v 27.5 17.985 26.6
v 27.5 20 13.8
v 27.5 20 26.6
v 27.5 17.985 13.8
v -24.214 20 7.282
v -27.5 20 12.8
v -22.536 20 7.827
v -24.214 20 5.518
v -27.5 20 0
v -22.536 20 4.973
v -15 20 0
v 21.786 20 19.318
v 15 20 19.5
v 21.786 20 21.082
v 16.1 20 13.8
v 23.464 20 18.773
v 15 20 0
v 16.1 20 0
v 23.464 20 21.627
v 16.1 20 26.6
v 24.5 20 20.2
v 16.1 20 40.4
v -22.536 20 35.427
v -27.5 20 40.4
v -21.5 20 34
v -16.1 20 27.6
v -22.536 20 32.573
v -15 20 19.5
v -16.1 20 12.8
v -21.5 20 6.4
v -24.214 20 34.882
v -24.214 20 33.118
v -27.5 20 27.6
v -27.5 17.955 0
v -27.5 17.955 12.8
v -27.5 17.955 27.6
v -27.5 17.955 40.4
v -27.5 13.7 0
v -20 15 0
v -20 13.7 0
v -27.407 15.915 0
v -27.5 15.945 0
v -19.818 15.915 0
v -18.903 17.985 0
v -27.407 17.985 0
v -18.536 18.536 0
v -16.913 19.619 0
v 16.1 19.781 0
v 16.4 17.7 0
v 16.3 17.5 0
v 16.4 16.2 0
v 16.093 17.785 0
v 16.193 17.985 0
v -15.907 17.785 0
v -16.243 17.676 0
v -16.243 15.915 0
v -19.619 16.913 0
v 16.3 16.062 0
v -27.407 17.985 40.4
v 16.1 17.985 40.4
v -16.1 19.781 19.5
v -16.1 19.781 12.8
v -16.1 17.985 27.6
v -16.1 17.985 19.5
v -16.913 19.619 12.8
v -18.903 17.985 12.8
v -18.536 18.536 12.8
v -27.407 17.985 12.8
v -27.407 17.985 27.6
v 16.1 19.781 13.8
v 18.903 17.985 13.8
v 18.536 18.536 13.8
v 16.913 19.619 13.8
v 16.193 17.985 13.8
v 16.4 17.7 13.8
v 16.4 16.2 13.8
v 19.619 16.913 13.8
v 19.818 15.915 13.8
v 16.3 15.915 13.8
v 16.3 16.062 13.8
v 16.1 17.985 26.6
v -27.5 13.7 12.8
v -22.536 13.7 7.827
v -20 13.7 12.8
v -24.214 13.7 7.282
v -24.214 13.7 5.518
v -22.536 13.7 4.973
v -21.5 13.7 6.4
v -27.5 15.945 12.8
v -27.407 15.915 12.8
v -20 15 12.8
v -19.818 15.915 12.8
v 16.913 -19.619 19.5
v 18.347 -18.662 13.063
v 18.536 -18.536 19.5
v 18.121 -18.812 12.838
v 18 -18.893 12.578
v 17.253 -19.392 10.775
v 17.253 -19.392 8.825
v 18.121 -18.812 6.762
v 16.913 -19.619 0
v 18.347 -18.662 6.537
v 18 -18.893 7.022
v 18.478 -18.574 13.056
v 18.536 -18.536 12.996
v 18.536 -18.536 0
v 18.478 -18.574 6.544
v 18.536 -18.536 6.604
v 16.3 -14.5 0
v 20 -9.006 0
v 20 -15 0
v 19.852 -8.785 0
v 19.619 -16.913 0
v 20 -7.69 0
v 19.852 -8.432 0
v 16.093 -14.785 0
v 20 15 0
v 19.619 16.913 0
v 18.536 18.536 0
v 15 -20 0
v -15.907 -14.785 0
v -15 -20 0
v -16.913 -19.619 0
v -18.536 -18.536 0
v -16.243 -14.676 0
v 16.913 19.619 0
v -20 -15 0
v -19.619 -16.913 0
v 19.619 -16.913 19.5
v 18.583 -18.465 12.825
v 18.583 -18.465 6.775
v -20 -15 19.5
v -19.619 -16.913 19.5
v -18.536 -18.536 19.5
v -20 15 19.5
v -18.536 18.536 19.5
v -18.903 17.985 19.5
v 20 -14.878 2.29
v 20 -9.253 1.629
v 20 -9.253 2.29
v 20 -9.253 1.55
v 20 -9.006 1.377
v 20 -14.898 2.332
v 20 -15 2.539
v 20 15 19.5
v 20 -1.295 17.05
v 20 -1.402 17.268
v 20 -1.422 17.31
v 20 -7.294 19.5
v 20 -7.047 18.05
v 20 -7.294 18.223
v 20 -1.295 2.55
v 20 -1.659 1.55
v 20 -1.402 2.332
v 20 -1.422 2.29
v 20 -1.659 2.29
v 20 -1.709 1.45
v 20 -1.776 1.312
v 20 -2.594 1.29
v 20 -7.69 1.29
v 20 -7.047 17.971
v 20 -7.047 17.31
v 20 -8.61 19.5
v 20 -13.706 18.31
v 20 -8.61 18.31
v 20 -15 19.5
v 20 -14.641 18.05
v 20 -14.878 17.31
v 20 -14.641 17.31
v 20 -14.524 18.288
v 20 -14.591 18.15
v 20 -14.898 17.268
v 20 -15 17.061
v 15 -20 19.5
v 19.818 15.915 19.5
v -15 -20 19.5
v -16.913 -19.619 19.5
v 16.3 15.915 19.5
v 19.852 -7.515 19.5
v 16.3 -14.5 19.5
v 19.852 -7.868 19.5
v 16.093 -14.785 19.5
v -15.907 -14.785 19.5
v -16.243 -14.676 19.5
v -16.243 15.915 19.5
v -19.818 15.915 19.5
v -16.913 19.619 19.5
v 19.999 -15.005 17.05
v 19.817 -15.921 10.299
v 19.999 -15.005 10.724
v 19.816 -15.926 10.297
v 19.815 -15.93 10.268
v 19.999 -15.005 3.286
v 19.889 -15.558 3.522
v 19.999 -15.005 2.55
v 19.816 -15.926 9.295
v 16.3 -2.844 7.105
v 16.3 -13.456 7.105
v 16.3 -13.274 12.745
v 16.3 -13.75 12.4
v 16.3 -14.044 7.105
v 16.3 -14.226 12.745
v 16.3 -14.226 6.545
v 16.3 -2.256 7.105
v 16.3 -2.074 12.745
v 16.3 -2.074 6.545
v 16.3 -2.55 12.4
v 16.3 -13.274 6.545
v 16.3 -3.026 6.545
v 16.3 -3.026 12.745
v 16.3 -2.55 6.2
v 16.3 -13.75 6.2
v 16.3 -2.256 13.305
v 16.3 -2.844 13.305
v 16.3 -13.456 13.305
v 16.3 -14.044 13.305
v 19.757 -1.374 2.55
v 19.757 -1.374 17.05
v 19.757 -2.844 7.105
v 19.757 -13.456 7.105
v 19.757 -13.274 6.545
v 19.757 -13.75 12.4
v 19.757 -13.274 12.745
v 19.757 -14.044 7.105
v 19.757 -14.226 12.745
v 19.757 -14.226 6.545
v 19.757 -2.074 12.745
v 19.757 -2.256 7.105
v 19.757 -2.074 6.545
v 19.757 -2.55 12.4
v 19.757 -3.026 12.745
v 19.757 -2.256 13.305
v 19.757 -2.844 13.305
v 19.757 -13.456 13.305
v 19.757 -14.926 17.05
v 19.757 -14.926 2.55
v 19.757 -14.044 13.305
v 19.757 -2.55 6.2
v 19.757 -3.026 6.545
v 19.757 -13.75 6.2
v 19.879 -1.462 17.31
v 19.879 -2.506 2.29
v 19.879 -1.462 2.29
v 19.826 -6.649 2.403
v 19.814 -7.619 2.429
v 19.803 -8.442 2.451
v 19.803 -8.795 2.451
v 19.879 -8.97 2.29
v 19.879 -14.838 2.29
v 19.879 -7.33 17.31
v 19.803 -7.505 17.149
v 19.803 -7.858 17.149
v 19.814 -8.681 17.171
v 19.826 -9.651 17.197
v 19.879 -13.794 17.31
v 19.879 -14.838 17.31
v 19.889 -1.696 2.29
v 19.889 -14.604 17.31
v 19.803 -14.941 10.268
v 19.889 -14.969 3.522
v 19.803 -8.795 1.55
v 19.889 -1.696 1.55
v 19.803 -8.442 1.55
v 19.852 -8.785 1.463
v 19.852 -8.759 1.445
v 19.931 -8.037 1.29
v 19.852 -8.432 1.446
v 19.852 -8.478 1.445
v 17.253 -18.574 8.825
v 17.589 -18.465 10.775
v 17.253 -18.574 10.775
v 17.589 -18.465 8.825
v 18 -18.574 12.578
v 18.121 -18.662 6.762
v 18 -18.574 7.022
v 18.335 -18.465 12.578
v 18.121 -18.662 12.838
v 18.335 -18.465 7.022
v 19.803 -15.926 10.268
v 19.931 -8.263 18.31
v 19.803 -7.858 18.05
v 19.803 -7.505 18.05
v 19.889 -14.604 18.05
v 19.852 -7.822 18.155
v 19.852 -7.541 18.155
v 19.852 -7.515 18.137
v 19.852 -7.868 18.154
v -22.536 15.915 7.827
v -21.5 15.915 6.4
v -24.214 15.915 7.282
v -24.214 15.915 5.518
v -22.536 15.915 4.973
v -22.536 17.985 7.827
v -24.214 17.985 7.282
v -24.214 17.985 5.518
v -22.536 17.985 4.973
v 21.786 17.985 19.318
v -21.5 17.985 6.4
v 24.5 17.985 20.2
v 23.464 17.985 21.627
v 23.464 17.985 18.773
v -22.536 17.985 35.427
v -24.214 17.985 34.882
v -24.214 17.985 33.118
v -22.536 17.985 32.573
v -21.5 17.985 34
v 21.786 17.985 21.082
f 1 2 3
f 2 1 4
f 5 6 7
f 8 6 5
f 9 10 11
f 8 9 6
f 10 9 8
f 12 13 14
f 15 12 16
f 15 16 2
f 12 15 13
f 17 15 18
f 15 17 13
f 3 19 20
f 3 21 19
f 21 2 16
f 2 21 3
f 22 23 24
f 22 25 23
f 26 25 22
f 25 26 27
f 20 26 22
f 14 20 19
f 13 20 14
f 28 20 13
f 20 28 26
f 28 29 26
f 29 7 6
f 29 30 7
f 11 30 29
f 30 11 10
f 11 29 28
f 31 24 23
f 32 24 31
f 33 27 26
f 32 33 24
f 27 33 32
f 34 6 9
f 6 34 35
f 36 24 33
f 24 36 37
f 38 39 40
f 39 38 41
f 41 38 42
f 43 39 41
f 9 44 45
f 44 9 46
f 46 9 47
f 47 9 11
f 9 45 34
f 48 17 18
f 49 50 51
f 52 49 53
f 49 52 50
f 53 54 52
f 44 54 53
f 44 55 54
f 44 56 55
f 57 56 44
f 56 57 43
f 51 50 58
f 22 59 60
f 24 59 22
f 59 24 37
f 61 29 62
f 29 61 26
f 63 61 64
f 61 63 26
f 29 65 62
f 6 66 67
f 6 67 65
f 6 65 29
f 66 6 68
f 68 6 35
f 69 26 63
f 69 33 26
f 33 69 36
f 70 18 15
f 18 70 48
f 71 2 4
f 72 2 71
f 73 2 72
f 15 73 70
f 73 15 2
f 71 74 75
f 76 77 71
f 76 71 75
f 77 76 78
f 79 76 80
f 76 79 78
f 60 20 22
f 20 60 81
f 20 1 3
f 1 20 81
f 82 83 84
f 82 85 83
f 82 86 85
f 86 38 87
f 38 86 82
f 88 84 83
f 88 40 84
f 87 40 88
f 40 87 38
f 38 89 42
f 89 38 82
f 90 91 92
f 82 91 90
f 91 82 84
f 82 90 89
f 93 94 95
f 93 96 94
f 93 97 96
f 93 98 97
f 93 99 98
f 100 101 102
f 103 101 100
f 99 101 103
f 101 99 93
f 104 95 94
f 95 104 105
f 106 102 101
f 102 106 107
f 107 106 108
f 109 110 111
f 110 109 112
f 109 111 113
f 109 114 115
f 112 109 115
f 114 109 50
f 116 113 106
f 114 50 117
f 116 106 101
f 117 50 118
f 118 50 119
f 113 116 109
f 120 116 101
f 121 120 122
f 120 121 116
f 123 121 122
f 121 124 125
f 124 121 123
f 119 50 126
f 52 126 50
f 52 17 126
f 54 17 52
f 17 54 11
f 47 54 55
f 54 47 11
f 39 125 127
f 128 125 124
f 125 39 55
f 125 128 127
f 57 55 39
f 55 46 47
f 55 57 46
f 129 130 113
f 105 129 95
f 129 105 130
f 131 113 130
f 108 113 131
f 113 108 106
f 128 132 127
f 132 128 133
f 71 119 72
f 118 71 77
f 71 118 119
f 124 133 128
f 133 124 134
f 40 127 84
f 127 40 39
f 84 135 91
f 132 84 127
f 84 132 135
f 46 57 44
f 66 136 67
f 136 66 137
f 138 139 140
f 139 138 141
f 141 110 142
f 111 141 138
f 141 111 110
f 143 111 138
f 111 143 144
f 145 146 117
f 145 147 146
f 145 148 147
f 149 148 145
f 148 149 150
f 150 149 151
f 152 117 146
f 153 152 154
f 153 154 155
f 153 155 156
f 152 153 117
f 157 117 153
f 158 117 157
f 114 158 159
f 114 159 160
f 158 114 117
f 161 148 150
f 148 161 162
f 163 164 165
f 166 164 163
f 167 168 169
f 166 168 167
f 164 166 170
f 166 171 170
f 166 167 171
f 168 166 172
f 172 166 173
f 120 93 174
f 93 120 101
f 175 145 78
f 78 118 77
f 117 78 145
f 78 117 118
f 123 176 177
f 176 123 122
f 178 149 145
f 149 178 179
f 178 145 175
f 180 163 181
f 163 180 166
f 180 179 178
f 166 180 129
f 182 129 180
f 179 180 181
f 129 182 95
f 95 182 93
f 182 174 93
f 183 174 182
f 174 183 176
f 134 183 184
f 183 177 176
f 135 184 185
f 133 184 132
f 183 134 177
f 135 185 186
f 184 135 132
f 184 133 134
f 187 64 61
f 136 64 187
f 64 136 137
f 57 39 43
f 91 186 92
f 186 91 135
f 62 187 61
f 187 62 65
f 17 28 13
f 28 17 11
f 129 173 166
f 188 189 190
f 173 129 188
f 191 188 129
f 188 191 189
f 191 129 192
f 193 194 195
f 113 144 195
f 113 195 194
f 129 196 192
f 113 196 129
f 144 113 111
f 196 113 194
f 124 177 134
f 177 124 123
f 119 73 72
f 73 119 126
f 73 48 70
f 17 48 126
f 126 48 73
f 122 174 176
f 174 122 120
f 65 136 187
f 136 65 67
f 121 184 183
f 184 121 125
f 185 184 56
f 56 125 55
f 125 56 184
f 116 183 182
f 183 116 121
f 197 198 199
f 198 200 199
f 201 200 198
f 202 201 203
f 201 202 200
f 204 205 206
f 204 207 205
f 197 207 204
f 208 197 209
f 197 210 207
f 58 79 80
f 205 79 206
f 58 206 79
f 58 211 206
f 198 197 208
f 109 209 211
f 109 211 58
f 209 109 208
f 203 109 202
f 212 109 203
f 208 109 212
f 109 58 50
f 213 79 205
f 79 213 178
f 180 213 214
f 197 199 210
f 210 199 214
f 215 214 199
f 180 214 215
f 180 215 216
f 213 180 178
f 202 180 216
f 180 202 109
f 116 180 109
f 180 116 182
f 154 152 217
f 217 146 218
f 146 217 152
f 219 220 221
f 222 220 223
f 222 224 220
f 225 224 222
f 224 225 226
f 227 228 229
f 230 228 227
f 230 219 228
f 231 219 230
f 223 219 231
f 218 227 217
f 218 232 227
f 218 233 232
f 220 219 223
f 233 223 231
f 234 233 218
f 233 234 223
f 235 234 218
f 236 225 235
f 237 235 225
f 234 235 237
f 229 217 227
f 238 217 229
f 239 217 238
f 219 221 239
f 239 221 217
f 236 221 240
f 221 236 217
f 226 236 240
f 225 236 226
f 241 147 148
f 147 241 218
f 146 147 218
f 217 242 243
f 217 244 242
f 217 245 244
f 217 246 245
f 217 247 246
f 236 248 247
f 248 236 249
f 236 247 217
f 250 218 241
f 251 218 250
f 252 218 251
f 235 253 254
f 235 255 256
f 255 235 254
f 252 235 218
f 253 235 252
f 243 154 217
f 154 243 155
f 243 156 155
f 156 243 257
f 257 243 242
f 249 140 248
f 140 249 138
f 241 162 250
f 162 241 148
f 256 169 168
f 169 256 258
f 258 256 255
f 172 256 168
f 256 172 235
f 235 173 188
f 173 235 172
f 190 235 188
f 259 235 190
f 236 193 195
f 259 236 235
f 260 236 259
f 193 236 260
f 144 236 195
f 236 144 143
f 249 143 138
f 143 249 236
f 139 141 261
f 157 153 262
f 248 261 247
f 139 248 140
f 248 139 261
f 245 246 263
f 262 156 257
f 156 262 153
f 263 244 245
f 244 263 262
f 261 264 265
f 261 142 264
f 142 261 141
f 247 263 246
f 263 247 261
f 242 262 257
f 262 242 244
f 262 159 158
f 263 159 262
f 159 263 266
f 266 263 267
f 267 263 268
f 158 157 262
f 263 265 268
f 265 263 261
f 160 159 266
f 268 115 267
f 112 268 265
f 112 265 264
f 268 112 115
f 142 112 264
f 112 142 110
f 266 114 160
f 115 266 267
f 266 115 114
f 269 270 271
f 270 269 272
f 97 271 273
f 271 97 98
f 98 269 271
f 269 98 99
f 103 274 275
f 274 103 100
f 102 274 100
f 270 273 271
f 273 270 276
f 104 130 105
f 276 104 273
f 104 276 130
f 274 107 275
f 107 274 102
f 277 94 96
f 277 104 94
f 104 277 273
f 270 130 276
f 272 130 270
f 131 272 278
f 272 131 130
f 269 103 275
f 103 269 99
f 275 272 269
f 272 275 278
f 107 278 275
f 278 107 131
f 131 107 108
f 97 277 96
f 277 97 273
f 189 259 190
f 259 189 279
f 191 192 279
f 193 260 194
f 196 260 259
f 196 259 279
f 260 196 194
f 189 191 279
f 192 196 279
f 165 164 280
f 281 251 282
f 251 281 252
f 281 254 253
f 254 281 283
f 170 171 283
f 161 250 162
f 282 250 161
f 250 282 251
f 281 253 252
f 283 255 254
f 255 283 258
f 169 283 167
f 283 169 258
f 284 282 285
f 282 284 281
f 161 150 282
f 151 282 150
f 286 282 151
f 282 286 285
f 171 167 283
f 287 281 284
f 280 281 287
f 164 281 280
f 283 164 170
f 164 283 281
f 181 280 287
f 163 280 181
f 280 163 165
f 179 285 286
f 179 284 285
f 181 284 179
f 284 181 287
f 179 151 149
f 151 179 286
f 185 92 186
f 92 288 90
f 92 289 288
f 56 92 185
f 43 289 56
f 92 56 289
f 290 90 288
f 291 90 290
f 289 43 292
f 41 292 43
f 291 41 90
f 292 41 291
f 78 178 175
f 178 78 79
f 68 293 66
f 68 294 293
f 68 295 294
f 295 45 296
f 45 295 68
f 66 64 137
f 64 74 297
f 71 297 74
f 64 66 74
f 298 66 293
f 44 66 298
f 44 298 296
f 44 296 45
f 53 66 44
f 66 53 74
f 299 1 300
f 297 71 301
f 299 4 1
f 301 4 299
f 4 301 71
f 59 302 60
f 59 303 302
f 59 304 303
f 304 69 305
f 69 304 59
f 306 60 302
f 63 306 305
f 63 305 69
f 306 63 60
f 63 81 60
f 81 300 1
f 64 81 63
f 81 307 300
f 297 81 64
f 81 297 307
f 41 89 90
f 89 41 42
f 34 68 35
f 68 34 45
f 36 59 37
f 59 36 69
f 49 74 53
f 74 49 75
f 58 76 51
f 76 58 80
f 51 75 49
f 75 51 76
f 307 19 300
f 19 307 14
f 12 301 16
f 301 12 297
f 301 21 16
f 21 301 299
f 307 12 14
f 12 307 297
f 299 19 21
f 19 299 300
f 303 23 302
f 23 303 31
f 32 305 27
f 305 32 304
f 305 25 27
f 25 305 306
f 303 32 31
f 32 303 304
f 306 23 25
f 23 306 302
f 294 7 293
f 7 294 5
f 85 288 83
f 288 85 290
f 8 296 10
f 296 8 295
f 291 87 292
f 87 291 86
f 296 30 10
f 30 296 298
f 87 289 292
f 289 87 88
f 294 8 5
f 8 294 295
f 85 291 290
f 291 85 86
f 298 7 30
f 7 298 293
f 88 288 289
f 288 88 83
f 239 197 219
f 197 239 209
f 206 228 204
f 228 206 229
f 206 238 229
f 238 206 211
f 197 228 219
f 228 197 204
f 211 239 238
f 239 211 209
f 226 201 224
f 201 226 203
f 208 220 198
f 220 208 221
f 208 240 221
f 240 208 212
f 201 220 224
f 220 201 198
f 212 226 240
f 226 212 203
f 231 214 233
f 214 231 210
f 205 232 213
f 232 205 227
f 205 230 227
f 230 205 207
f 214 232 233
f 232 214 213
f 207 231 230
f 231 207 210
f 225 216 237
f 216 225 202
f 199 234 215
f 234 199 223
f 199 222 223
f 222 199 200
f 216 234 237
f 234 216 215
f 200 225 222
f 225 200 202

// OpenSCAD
module quad(x2, y2){
    x = x2/2;
    y = y2/2;
    translate([x, y, 0]) children();
    translate([x, -y, 0]) children();
    translate([-x, y, 0]) children();
    translate([-x, -y, 0]) children();
}

module cCube(v){
    x = v[0]/2;
    y = v[1]/2;
    translate([-x, -y, 0]) cube(v);
}

module smaFemale(){
    r=6.3/2;
    l=7;
    cylinder(l,r,r);
}

module relayBody411cj(){
    r = 3;
    bs = 32.4;
    th=58.5;
    hull(){
        quad(bs-2*r, bs-2*3) cylinder(1,r,r);
        translate([0,0,th-r])quad(bs-2*r, bs-2*3) sphere(r);
    }
    lsma=22.6-6.3;
    quad(lsma, lsma) rotate([180,0,0])smaFemale();
    
    translate([0,0,th])rotate([0,0,45])cCube([31, 13, 8]);
    translate([-bs/2, 0,6]) sphere(2.5);
    translate([bs/2, 0,6]) sphere(2.5);
    translate([0, -bs/2,6]) sphere(2.5);
}

module placeMountingPlateHolePattern411cj(){
    s=27.6/2;
    translate([23, 0, 0]) children();
    translate([-23, -s, 0]) children();
    translate([-23, s, 0]) children();
}

module mountingPlateBody411cj(t=1.5){
    l = 55;
    w = 40.4;
    
    cl=11.4;
    cw=14.8;
    
    cl2 = 11.4;
    cw2 = 13.8;
    tc = t+0.5;
    difference(){
    cCube([l, w, t]);
        translate([-l/2+cl/2, 0, 0])cCube([cl, cw, tc]);
        translate([l/2-cl2/2, w/2-cw2/2, 0])cCube([cl2, cw2, tc]);
        translate([l/2-cl2/2, -w/2+cw2/2, 0])cCube([cl2, cw2, tc]);
        //placeMountingPlateHolePattern() cylinder(2, 3.6/2, 3.6/2);
    }
}

module mountingPlate411cj(t=1.5){
    difference(){
        mountingPlateBody411cj(t=t);
        placeMountingPlateHolePattern411cj() cylinder(t+0.5, 3.6/2, 3.6/2);
    }
}

module placeMontingBracketOnRelay411cj() {
    s=40.4/2;
    bs = 32.4/2;
    translate([0, bs, s])rotate([-90,0,0]) children();
}

module relay411cj(){
    placeMontingBracketOnRelay411cj() mountingPlate411cj();
    relayBody411cj();
}


module mixerHolePattern(){
    quad(6.2, 11.2) children();
}

module mixerSmaConnector(r=6.3/2){
    //r=6.3/2;
    rm = 4.7/2;
    cylinder(9.6, rm, rm);
    translate([0,0,4])cylinder(5.6, r, r);
    hull(){
        cylinder(1, 2.4, 2.4);
        cCube([13.2, 2, 1]);
    }
    quad(10.4,0)cylinder(2+1, 2.3/2, 2.3/2);
}

module mixerBody(){
        cCube([14.5, 13.2, 4.8]);
}

module mixer(r=6.3/2){
    l=14.5;
    w=13.2;
    h=4.8/2;
    difference(){
        mixerBody();
         mixerHolePattern() cylinder(6,0.8, 0.8);
    }
    translate([0, -w/2, h])rotate([90, 0, 0]) rotate([0,0,-45/4])mixerSmaConnector(r=r);
    rotate([0,0,90])translate([0, -l/2, h])rotate([90, 0, 0]) rotate([0,0,-45/4])mixerSmaConnector(r=r);
    rotate([0,0,3*90])translate([0, -l/2, h])rotate([90, 0, 0]) rotate([0,0,-45/4])mixerSmaConnector(r=r);
}

module bracketBody(){
    r=5;
    difference(){
        union(){
            hull() quad(35-r, 35-r) cylinder(19.5,r,r);
            placeMontingBracketOnRelay411cj()mountingPlateBody411cj(t=3.8);
            intersection(){
                translate([-30,0,0]) cube(20);
                translate([0,-2.5,0])placeMontingBracketOnRelay411cj()mountingPlateBody411cj(t=3.8-1.5);
            }
            
        }
        minkowski(){
            children();
            //relay411cj();
            sphere(0.3);
        }
        minkowski(){
            union(){
                placeMixer() mixerBody();
                placeMixer() mixer(r=5);
            }
            sphere(0.3);
        }
        placeMontingBracketOnRelay411cj(){
            minkowski(){
                mountingPlateBody411cj();
                rotate([90, 0, 0])cylinder(100, 0.3, 0.3);
            }
        }
    }
    
}

module bracket411cj(){
    difference(){
        bracketBody() relay411cjBody();
        translate([0,-10,0])placeMontingBracketOnRelay411cj() placeMountingPlateHolePattern411cj() cylinder(20, 1.5, 1.5);
        translate([-8,0,0])placeMixer() mixerHolePattern() cylinder(10, 0.5, 0.5);
    }
    
}

module bracket87222c(){
    difference(){
        bracketBody() relay87222cBody();
        translate([0,-10,0])placeMontingBracketOnRelay411cj() placeMountingPlateHolePattern411cj() cylinder(20, 1.5, 1.5);
        translate([-8,0,0])placeMixer() mixerHolePattern() cylinder(10, 0.5, 0.5);
    }
    
}


module placeMixer(){
    translate([20,-(22.6-6.3)/2,9.8])rotate([0,90,0])children();
}

module transferSwitch411cjAssembly(){
    placeMixer() mixer();
    relay411cj(); 
    bracket411cj();
}

module relay87222cControlConnectorBody(){
    difference(){
        cCube([20.6, 8.8, 5]);
        cCube([18.6, 6.8, 5]);
        translate([0,5.5,0])cCube([5,5,7]);
    }
    translate([0,5.5,0])cCube([2,2,7]);
}

module relay87222cBody(){
    translate([0,1.5,0]){
        cCube([32, 32, 55]);
        lsma=19.2-6.3;
        quad(lsma, lsma) rotate([180,0,0])smaFemale();
        translate([5,-11,55]) relay87222cControlConnectorBody();    
    }
}

module placeRelay87222cHoles(){
    lshole=18.5-2;
    rotate([0,0,45]) quad(lshole, lshole) children();
}

module relay87222c(){
    difference(){
        relay87222cBody();
        placeRelay87222cHoles() cylinder(10,1,1);
    }
}

module placeMountingPlateOnrelay87222c(){
    s=40.4/2;
    bs = 32.4/2;
    translate([0, bs, s])rotate([-90,0,0]) children();
}

bracket87222c();
//relay87222c();
//placeMountingPlateOnrelay87222c() mountingPlate411cj();
//bracket411cj();
//transferSwitch411cjAssembly();
//bracket();
